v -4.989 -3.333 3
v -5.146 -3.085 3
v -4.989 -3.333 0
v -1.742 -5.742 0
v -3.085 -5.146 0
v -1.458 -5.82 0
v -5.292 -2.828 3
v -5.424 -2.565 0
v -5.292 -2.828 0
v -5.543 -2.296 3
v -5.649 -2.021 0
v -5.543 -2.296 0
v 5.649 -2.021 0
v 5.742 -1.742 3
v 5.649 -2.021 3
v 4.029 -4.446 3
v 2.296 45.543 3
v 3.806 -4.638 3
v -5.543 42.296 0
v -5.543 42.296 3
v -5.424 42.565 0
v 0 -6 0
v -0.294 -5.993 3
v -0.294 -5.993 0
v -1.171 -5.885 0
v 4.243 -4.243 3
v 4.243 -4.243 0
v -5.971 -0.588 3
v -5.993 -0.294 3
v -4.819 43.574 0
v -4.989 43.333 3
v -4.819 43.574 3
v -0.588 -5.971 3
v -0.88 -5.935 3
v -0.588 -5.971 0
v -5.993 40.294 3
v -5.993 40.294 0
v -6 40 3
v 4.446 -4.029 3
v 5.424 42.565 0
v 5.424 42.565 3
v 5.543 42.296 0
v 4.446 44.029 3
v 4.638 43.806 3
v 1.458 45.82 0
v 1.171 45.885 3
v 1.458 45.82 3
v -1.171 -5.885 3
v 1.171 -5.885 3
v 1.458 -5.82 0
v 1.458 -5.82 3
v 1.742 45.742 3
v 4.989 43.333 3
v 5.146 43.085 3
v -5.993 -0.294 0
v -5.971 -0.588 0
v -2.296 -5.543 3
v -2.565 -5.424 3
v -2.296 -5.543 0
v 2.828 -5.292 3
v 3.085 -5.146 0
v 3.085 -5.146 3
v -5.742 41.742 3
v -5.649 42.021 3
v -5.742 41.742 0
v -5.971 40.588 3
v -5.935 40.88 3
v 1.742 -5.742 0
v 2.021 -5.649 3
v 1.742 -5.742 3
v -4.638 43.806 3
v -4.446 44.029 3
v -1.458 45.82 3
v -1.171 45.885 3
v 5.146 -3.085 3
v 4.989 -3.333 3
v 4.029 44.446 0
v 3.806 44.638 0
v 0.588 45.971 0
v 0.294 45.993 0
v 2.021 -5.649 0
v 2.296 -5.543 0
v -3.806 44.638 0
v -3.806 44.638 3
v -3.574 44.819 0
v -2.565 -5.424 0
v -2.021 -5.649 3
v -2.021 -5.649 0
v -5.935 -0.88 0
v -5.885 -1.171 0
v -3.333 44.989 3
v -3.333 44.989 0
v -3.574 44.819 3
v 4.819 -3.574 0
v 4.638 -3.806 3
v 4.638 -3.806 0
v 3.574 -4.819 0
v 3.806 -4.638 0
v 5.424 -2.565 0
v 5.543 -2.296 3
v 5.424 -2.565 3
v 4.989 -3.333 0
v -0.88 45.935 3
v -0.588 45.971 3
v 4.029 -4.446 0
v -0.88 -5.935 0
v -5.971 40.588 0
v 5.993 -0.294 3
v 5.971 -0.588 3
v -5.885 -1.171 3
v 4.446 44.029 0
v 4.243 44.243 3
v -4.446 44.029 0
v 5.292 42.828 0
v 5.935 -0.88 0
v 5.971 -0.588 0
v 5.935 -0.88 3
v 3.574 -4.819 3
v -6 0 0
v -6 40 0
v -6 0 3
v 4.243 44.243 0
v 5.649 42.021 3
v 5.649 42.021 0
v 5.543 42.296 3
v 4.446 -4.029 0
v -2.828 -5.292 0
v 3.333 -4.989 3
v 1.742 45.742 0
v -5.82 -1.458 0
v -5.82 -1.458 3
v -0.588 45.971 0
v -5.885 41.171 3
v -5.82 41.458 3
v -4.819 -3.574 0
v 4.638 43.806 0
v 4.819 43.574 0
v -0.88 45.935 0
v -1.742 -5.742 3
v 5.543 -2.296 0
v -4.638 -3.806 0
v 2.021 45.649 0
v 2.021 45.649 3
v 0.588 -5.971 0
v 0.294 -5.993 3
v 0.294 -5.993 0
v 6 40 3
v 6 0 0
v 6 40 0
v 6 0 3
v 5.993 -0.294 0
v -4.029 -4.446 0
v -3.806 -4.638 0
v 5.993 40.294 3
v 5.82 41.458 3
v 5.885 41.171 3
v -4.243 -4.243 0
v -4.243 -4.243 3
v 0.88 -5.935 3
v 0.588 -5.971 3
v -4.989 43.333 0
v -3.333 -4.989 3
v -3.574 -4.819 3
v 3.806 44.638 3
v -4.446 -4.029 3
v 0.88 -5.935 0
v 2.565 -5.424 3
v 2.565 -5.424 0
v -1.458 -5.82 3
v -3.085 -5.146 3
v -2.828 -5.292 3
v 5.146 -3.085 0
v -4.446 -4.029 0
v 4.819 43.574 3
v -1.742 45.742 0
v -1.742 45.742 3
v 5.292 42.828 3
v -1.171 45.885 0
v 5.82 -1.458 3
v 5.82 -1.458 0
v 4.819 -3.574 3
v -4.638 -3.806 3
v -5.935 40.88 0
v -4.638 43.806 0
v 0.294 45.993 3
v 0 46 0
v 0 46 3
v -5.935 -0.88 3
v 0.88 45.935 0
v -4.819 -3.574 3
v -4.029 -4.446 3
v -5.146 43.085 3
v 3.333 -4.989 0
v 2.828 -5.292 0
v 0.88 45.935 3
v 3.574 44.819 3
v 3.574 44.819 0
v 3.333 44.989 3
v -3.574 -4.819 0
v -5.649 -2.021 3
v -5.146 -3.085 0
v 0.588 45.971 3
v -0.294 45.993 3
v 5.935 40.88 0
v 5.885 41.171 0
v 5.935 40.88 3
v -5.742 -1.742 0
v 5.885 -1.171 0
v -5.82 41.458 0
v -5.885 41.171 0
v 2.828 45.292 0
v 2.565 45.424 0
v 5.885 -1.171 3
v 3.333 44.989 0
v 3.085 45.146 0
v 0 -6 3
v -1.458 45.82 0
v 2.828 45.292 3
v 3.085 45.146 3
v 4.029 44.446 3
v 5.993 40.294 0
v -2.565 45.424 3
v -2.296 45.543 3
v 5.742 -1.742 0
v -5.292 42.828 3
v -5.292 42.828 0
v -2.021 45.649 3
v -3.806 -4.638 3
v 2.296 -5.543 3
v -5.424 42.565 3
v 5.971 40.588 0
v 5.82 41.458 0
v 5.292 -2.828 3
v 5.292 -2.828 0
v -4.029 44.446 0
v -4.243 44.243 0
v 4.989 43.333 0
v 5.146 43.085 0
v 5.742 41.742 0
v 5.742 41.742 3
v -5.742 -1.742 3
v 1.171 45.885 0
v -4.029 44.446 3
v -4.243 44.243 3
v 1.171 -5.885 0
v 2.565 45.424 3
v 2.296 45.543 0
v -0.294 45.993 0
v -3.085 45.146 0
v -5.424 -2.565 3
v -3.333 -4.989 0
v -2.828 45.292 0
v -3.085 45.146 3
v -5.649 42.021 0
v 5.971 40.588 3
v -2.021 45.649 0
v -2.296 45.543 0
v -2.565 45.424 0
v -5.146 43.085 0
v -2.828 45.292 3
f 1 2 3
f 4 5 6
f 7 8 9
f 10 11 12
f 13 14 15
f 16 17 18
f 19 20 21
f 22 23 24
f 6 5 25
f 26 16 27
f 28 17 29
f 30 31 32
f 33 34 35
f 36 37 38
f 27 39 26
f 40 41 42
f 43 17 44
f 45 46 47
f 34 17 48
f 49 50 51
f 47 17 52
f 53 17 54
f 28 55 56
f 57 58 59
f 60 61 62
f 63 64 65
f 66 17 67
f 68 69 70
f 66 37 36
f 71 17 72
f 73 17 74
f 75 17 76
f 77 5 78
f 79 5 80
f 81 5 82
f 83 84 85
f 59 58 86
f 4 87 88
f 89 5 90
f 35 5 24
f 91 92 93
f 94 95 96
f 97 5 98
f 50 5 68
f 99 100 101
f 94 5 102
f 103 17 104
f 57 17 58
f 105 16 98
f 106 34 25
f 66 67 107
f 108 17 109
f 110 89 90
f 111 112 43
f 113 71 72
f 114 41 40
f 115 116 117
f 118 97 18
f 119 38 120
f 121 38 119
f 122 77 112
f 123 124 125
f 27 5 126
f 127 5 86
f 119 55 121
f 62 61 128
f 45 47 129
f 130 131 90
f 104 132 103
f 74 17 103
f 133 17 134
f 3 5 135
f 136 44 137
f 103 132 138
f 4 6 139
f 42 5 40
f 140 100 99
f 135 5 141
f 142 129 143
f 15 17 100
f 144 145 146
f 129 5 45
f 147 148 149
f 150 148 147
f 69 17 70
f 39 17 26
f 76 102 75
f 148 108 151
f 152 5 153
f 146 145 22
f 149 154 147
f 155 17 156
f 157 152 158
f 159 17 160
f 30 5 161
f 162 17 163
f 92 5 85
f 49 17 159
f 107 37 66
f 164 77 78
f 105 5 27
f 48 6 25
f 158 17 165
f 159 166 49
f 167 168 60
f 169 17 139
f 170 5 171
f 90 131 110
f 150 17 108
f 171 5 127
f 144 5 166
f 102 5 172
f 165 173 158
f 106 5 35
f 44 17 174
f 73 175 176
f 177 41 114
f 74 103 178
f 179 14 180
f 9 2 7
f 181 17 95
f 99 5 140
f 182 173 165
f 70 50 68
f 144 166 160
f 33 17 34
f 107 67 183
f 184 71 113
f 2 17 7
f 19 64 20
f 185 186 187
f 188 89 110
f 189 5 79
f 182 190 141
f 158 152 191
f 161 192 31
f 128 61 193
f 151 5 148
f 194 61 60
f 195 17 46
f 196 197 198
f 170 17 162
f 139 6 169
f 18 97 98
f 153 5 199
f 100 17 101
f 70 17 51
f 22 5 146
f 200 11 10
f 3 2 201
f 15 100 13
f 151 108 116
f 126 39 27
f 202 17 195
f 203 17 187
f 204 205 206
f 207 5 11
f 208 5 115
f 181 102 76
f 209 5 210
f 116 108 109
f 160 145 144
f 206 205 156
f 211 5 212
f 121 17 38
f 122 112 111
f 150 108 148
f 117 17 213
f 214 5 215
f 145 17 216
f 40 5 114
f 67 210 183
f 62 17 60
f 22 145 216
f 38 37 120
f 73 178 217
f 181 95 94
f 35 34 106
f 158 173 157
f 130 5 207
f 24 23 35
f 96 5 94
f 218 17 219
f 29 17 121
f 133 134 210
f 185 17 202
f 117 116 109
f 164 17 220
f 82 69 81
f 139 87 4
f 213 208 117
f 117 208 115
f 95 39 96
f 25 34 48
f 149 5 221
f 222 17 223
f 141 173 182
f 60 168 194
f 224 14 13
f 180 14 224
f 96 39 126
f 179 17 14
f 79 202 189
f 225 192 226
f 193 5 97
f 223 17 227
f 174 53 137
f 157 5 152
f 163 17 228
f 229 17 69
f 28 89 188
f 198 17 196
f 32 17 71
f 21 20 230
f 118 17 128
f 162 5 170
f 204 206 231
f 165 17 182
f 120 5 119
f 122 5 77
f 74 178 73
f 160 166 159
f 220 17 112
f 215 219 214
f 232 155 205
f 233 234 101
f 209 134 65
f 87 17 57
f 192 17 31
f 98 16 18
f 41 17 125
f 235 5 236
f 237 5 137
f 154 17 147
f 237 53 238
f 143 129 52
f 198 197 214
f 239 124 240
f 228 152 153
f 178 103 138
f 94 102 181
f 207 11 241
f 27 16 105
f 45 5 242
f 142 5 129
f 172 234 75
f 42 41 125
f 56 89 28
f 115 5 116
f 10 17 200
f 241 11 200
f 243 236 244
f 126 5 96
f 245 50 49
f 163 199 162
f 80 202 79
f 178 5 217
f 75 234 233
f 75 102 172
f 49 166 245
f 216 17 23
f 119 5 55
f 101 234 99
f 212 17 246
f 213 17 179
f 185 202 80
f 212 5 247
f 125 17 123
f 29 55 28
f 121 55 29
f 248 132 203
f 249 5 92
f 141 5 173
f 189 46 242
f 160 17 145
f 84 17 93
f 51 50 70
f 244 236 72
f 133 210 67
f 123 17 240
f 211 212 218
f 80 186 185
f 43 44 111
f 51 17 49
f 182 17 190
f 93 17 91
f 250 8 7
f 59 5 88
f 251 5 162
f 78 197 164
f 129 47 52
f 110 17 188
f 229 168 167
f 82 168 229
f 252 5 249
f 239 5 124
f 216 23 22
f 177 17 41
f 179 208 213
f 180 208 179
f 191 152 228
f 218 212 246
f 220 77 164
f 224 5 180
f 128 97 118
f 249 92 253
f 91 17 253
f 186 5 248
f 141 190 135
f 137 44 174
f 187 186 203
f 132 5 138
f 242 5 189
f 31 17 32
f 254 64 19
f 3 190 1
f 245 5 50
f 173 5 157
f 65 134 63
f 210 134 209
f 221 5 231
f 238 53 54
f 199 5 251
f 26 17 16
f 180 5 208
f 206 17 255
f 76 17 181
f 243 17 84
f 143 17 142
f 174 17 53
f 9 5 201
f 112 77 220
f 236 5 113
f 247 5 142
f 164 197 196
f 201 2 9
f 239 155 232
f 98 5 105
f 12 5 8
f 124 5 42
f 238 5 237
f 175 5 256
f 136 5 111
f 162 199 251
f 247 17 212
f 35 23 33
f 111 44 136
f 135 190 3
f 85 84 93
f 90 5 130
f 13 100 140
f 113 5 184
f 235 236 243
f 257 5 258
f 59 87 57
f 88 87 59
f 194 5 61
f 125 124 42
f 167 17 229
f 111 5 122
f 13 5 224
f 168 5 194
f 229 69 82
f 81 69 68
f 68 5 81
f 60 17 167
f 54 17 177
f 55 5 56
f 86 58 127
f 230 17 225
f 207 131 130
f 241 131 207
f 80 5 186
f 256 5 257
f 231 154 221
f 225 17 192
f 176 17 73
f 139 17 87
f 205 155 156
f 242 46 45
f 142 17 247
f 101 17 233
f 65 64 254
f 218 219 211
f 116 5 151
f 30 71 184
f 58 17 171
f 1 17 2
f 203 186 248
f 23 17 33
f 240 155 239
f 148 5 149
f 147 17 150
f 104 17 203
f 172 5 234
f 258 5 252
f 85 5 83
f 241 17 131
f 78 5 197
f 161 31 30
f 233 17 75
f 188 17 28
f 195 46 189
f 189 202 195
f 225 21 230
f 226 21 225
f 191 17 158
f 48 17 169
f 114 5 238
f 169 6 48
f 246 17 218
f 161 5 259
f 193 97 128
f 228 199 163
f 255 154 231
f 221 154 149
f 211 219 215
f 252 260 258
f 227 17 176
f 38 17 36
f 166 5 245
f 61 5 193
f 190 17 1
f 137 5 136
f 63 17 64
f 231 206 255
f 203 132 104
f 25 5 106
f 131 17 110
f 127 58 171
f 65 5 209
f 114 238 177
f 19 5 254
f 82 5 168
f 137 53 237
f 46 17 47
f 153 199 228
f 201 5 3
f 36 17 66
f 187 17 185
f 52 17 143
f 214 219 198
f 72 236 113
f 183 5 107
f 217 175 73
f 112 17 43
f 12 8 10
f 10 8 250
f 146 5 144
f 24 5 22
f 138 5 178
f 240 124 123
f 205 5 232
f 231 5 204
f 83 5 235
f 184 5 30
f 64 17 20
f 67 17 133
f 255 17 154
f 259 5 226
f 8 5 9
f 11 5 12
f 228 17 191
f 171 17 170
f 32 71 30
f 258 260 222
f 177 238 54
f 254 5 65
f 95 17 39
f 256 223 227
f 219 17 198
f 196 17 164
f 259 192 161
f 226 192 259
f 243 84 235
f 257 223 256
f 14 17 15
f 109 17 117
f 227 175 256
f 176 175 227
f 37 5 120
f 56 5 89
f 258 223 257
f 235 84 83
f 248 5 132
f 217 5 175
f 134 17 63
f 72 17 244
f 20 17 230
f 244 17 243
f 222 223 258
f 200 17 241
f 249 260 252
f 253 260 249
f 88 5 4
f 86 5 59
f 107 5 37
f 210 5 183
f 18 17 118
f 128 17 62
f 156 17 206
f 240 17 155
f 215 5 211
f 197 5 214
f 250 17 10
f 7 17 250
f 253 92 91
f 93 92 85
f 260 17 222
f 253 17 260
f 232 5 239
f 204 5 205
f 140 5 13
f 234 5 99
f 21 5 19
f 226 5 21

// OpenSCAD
        

module bone(length, width, thickness, _fn) {
    hull() {
        cylinder(h = thickness, r = width, center = false, $fn = _fn);
        translate([0, length, 0])
            cylinder(h = thickness, r = width, center = false, $fn = _fn);
    }
}


// demo bone
bone(
    length = 40,
    width = 6,
    thickness = 3,
    _fn = 128
);
